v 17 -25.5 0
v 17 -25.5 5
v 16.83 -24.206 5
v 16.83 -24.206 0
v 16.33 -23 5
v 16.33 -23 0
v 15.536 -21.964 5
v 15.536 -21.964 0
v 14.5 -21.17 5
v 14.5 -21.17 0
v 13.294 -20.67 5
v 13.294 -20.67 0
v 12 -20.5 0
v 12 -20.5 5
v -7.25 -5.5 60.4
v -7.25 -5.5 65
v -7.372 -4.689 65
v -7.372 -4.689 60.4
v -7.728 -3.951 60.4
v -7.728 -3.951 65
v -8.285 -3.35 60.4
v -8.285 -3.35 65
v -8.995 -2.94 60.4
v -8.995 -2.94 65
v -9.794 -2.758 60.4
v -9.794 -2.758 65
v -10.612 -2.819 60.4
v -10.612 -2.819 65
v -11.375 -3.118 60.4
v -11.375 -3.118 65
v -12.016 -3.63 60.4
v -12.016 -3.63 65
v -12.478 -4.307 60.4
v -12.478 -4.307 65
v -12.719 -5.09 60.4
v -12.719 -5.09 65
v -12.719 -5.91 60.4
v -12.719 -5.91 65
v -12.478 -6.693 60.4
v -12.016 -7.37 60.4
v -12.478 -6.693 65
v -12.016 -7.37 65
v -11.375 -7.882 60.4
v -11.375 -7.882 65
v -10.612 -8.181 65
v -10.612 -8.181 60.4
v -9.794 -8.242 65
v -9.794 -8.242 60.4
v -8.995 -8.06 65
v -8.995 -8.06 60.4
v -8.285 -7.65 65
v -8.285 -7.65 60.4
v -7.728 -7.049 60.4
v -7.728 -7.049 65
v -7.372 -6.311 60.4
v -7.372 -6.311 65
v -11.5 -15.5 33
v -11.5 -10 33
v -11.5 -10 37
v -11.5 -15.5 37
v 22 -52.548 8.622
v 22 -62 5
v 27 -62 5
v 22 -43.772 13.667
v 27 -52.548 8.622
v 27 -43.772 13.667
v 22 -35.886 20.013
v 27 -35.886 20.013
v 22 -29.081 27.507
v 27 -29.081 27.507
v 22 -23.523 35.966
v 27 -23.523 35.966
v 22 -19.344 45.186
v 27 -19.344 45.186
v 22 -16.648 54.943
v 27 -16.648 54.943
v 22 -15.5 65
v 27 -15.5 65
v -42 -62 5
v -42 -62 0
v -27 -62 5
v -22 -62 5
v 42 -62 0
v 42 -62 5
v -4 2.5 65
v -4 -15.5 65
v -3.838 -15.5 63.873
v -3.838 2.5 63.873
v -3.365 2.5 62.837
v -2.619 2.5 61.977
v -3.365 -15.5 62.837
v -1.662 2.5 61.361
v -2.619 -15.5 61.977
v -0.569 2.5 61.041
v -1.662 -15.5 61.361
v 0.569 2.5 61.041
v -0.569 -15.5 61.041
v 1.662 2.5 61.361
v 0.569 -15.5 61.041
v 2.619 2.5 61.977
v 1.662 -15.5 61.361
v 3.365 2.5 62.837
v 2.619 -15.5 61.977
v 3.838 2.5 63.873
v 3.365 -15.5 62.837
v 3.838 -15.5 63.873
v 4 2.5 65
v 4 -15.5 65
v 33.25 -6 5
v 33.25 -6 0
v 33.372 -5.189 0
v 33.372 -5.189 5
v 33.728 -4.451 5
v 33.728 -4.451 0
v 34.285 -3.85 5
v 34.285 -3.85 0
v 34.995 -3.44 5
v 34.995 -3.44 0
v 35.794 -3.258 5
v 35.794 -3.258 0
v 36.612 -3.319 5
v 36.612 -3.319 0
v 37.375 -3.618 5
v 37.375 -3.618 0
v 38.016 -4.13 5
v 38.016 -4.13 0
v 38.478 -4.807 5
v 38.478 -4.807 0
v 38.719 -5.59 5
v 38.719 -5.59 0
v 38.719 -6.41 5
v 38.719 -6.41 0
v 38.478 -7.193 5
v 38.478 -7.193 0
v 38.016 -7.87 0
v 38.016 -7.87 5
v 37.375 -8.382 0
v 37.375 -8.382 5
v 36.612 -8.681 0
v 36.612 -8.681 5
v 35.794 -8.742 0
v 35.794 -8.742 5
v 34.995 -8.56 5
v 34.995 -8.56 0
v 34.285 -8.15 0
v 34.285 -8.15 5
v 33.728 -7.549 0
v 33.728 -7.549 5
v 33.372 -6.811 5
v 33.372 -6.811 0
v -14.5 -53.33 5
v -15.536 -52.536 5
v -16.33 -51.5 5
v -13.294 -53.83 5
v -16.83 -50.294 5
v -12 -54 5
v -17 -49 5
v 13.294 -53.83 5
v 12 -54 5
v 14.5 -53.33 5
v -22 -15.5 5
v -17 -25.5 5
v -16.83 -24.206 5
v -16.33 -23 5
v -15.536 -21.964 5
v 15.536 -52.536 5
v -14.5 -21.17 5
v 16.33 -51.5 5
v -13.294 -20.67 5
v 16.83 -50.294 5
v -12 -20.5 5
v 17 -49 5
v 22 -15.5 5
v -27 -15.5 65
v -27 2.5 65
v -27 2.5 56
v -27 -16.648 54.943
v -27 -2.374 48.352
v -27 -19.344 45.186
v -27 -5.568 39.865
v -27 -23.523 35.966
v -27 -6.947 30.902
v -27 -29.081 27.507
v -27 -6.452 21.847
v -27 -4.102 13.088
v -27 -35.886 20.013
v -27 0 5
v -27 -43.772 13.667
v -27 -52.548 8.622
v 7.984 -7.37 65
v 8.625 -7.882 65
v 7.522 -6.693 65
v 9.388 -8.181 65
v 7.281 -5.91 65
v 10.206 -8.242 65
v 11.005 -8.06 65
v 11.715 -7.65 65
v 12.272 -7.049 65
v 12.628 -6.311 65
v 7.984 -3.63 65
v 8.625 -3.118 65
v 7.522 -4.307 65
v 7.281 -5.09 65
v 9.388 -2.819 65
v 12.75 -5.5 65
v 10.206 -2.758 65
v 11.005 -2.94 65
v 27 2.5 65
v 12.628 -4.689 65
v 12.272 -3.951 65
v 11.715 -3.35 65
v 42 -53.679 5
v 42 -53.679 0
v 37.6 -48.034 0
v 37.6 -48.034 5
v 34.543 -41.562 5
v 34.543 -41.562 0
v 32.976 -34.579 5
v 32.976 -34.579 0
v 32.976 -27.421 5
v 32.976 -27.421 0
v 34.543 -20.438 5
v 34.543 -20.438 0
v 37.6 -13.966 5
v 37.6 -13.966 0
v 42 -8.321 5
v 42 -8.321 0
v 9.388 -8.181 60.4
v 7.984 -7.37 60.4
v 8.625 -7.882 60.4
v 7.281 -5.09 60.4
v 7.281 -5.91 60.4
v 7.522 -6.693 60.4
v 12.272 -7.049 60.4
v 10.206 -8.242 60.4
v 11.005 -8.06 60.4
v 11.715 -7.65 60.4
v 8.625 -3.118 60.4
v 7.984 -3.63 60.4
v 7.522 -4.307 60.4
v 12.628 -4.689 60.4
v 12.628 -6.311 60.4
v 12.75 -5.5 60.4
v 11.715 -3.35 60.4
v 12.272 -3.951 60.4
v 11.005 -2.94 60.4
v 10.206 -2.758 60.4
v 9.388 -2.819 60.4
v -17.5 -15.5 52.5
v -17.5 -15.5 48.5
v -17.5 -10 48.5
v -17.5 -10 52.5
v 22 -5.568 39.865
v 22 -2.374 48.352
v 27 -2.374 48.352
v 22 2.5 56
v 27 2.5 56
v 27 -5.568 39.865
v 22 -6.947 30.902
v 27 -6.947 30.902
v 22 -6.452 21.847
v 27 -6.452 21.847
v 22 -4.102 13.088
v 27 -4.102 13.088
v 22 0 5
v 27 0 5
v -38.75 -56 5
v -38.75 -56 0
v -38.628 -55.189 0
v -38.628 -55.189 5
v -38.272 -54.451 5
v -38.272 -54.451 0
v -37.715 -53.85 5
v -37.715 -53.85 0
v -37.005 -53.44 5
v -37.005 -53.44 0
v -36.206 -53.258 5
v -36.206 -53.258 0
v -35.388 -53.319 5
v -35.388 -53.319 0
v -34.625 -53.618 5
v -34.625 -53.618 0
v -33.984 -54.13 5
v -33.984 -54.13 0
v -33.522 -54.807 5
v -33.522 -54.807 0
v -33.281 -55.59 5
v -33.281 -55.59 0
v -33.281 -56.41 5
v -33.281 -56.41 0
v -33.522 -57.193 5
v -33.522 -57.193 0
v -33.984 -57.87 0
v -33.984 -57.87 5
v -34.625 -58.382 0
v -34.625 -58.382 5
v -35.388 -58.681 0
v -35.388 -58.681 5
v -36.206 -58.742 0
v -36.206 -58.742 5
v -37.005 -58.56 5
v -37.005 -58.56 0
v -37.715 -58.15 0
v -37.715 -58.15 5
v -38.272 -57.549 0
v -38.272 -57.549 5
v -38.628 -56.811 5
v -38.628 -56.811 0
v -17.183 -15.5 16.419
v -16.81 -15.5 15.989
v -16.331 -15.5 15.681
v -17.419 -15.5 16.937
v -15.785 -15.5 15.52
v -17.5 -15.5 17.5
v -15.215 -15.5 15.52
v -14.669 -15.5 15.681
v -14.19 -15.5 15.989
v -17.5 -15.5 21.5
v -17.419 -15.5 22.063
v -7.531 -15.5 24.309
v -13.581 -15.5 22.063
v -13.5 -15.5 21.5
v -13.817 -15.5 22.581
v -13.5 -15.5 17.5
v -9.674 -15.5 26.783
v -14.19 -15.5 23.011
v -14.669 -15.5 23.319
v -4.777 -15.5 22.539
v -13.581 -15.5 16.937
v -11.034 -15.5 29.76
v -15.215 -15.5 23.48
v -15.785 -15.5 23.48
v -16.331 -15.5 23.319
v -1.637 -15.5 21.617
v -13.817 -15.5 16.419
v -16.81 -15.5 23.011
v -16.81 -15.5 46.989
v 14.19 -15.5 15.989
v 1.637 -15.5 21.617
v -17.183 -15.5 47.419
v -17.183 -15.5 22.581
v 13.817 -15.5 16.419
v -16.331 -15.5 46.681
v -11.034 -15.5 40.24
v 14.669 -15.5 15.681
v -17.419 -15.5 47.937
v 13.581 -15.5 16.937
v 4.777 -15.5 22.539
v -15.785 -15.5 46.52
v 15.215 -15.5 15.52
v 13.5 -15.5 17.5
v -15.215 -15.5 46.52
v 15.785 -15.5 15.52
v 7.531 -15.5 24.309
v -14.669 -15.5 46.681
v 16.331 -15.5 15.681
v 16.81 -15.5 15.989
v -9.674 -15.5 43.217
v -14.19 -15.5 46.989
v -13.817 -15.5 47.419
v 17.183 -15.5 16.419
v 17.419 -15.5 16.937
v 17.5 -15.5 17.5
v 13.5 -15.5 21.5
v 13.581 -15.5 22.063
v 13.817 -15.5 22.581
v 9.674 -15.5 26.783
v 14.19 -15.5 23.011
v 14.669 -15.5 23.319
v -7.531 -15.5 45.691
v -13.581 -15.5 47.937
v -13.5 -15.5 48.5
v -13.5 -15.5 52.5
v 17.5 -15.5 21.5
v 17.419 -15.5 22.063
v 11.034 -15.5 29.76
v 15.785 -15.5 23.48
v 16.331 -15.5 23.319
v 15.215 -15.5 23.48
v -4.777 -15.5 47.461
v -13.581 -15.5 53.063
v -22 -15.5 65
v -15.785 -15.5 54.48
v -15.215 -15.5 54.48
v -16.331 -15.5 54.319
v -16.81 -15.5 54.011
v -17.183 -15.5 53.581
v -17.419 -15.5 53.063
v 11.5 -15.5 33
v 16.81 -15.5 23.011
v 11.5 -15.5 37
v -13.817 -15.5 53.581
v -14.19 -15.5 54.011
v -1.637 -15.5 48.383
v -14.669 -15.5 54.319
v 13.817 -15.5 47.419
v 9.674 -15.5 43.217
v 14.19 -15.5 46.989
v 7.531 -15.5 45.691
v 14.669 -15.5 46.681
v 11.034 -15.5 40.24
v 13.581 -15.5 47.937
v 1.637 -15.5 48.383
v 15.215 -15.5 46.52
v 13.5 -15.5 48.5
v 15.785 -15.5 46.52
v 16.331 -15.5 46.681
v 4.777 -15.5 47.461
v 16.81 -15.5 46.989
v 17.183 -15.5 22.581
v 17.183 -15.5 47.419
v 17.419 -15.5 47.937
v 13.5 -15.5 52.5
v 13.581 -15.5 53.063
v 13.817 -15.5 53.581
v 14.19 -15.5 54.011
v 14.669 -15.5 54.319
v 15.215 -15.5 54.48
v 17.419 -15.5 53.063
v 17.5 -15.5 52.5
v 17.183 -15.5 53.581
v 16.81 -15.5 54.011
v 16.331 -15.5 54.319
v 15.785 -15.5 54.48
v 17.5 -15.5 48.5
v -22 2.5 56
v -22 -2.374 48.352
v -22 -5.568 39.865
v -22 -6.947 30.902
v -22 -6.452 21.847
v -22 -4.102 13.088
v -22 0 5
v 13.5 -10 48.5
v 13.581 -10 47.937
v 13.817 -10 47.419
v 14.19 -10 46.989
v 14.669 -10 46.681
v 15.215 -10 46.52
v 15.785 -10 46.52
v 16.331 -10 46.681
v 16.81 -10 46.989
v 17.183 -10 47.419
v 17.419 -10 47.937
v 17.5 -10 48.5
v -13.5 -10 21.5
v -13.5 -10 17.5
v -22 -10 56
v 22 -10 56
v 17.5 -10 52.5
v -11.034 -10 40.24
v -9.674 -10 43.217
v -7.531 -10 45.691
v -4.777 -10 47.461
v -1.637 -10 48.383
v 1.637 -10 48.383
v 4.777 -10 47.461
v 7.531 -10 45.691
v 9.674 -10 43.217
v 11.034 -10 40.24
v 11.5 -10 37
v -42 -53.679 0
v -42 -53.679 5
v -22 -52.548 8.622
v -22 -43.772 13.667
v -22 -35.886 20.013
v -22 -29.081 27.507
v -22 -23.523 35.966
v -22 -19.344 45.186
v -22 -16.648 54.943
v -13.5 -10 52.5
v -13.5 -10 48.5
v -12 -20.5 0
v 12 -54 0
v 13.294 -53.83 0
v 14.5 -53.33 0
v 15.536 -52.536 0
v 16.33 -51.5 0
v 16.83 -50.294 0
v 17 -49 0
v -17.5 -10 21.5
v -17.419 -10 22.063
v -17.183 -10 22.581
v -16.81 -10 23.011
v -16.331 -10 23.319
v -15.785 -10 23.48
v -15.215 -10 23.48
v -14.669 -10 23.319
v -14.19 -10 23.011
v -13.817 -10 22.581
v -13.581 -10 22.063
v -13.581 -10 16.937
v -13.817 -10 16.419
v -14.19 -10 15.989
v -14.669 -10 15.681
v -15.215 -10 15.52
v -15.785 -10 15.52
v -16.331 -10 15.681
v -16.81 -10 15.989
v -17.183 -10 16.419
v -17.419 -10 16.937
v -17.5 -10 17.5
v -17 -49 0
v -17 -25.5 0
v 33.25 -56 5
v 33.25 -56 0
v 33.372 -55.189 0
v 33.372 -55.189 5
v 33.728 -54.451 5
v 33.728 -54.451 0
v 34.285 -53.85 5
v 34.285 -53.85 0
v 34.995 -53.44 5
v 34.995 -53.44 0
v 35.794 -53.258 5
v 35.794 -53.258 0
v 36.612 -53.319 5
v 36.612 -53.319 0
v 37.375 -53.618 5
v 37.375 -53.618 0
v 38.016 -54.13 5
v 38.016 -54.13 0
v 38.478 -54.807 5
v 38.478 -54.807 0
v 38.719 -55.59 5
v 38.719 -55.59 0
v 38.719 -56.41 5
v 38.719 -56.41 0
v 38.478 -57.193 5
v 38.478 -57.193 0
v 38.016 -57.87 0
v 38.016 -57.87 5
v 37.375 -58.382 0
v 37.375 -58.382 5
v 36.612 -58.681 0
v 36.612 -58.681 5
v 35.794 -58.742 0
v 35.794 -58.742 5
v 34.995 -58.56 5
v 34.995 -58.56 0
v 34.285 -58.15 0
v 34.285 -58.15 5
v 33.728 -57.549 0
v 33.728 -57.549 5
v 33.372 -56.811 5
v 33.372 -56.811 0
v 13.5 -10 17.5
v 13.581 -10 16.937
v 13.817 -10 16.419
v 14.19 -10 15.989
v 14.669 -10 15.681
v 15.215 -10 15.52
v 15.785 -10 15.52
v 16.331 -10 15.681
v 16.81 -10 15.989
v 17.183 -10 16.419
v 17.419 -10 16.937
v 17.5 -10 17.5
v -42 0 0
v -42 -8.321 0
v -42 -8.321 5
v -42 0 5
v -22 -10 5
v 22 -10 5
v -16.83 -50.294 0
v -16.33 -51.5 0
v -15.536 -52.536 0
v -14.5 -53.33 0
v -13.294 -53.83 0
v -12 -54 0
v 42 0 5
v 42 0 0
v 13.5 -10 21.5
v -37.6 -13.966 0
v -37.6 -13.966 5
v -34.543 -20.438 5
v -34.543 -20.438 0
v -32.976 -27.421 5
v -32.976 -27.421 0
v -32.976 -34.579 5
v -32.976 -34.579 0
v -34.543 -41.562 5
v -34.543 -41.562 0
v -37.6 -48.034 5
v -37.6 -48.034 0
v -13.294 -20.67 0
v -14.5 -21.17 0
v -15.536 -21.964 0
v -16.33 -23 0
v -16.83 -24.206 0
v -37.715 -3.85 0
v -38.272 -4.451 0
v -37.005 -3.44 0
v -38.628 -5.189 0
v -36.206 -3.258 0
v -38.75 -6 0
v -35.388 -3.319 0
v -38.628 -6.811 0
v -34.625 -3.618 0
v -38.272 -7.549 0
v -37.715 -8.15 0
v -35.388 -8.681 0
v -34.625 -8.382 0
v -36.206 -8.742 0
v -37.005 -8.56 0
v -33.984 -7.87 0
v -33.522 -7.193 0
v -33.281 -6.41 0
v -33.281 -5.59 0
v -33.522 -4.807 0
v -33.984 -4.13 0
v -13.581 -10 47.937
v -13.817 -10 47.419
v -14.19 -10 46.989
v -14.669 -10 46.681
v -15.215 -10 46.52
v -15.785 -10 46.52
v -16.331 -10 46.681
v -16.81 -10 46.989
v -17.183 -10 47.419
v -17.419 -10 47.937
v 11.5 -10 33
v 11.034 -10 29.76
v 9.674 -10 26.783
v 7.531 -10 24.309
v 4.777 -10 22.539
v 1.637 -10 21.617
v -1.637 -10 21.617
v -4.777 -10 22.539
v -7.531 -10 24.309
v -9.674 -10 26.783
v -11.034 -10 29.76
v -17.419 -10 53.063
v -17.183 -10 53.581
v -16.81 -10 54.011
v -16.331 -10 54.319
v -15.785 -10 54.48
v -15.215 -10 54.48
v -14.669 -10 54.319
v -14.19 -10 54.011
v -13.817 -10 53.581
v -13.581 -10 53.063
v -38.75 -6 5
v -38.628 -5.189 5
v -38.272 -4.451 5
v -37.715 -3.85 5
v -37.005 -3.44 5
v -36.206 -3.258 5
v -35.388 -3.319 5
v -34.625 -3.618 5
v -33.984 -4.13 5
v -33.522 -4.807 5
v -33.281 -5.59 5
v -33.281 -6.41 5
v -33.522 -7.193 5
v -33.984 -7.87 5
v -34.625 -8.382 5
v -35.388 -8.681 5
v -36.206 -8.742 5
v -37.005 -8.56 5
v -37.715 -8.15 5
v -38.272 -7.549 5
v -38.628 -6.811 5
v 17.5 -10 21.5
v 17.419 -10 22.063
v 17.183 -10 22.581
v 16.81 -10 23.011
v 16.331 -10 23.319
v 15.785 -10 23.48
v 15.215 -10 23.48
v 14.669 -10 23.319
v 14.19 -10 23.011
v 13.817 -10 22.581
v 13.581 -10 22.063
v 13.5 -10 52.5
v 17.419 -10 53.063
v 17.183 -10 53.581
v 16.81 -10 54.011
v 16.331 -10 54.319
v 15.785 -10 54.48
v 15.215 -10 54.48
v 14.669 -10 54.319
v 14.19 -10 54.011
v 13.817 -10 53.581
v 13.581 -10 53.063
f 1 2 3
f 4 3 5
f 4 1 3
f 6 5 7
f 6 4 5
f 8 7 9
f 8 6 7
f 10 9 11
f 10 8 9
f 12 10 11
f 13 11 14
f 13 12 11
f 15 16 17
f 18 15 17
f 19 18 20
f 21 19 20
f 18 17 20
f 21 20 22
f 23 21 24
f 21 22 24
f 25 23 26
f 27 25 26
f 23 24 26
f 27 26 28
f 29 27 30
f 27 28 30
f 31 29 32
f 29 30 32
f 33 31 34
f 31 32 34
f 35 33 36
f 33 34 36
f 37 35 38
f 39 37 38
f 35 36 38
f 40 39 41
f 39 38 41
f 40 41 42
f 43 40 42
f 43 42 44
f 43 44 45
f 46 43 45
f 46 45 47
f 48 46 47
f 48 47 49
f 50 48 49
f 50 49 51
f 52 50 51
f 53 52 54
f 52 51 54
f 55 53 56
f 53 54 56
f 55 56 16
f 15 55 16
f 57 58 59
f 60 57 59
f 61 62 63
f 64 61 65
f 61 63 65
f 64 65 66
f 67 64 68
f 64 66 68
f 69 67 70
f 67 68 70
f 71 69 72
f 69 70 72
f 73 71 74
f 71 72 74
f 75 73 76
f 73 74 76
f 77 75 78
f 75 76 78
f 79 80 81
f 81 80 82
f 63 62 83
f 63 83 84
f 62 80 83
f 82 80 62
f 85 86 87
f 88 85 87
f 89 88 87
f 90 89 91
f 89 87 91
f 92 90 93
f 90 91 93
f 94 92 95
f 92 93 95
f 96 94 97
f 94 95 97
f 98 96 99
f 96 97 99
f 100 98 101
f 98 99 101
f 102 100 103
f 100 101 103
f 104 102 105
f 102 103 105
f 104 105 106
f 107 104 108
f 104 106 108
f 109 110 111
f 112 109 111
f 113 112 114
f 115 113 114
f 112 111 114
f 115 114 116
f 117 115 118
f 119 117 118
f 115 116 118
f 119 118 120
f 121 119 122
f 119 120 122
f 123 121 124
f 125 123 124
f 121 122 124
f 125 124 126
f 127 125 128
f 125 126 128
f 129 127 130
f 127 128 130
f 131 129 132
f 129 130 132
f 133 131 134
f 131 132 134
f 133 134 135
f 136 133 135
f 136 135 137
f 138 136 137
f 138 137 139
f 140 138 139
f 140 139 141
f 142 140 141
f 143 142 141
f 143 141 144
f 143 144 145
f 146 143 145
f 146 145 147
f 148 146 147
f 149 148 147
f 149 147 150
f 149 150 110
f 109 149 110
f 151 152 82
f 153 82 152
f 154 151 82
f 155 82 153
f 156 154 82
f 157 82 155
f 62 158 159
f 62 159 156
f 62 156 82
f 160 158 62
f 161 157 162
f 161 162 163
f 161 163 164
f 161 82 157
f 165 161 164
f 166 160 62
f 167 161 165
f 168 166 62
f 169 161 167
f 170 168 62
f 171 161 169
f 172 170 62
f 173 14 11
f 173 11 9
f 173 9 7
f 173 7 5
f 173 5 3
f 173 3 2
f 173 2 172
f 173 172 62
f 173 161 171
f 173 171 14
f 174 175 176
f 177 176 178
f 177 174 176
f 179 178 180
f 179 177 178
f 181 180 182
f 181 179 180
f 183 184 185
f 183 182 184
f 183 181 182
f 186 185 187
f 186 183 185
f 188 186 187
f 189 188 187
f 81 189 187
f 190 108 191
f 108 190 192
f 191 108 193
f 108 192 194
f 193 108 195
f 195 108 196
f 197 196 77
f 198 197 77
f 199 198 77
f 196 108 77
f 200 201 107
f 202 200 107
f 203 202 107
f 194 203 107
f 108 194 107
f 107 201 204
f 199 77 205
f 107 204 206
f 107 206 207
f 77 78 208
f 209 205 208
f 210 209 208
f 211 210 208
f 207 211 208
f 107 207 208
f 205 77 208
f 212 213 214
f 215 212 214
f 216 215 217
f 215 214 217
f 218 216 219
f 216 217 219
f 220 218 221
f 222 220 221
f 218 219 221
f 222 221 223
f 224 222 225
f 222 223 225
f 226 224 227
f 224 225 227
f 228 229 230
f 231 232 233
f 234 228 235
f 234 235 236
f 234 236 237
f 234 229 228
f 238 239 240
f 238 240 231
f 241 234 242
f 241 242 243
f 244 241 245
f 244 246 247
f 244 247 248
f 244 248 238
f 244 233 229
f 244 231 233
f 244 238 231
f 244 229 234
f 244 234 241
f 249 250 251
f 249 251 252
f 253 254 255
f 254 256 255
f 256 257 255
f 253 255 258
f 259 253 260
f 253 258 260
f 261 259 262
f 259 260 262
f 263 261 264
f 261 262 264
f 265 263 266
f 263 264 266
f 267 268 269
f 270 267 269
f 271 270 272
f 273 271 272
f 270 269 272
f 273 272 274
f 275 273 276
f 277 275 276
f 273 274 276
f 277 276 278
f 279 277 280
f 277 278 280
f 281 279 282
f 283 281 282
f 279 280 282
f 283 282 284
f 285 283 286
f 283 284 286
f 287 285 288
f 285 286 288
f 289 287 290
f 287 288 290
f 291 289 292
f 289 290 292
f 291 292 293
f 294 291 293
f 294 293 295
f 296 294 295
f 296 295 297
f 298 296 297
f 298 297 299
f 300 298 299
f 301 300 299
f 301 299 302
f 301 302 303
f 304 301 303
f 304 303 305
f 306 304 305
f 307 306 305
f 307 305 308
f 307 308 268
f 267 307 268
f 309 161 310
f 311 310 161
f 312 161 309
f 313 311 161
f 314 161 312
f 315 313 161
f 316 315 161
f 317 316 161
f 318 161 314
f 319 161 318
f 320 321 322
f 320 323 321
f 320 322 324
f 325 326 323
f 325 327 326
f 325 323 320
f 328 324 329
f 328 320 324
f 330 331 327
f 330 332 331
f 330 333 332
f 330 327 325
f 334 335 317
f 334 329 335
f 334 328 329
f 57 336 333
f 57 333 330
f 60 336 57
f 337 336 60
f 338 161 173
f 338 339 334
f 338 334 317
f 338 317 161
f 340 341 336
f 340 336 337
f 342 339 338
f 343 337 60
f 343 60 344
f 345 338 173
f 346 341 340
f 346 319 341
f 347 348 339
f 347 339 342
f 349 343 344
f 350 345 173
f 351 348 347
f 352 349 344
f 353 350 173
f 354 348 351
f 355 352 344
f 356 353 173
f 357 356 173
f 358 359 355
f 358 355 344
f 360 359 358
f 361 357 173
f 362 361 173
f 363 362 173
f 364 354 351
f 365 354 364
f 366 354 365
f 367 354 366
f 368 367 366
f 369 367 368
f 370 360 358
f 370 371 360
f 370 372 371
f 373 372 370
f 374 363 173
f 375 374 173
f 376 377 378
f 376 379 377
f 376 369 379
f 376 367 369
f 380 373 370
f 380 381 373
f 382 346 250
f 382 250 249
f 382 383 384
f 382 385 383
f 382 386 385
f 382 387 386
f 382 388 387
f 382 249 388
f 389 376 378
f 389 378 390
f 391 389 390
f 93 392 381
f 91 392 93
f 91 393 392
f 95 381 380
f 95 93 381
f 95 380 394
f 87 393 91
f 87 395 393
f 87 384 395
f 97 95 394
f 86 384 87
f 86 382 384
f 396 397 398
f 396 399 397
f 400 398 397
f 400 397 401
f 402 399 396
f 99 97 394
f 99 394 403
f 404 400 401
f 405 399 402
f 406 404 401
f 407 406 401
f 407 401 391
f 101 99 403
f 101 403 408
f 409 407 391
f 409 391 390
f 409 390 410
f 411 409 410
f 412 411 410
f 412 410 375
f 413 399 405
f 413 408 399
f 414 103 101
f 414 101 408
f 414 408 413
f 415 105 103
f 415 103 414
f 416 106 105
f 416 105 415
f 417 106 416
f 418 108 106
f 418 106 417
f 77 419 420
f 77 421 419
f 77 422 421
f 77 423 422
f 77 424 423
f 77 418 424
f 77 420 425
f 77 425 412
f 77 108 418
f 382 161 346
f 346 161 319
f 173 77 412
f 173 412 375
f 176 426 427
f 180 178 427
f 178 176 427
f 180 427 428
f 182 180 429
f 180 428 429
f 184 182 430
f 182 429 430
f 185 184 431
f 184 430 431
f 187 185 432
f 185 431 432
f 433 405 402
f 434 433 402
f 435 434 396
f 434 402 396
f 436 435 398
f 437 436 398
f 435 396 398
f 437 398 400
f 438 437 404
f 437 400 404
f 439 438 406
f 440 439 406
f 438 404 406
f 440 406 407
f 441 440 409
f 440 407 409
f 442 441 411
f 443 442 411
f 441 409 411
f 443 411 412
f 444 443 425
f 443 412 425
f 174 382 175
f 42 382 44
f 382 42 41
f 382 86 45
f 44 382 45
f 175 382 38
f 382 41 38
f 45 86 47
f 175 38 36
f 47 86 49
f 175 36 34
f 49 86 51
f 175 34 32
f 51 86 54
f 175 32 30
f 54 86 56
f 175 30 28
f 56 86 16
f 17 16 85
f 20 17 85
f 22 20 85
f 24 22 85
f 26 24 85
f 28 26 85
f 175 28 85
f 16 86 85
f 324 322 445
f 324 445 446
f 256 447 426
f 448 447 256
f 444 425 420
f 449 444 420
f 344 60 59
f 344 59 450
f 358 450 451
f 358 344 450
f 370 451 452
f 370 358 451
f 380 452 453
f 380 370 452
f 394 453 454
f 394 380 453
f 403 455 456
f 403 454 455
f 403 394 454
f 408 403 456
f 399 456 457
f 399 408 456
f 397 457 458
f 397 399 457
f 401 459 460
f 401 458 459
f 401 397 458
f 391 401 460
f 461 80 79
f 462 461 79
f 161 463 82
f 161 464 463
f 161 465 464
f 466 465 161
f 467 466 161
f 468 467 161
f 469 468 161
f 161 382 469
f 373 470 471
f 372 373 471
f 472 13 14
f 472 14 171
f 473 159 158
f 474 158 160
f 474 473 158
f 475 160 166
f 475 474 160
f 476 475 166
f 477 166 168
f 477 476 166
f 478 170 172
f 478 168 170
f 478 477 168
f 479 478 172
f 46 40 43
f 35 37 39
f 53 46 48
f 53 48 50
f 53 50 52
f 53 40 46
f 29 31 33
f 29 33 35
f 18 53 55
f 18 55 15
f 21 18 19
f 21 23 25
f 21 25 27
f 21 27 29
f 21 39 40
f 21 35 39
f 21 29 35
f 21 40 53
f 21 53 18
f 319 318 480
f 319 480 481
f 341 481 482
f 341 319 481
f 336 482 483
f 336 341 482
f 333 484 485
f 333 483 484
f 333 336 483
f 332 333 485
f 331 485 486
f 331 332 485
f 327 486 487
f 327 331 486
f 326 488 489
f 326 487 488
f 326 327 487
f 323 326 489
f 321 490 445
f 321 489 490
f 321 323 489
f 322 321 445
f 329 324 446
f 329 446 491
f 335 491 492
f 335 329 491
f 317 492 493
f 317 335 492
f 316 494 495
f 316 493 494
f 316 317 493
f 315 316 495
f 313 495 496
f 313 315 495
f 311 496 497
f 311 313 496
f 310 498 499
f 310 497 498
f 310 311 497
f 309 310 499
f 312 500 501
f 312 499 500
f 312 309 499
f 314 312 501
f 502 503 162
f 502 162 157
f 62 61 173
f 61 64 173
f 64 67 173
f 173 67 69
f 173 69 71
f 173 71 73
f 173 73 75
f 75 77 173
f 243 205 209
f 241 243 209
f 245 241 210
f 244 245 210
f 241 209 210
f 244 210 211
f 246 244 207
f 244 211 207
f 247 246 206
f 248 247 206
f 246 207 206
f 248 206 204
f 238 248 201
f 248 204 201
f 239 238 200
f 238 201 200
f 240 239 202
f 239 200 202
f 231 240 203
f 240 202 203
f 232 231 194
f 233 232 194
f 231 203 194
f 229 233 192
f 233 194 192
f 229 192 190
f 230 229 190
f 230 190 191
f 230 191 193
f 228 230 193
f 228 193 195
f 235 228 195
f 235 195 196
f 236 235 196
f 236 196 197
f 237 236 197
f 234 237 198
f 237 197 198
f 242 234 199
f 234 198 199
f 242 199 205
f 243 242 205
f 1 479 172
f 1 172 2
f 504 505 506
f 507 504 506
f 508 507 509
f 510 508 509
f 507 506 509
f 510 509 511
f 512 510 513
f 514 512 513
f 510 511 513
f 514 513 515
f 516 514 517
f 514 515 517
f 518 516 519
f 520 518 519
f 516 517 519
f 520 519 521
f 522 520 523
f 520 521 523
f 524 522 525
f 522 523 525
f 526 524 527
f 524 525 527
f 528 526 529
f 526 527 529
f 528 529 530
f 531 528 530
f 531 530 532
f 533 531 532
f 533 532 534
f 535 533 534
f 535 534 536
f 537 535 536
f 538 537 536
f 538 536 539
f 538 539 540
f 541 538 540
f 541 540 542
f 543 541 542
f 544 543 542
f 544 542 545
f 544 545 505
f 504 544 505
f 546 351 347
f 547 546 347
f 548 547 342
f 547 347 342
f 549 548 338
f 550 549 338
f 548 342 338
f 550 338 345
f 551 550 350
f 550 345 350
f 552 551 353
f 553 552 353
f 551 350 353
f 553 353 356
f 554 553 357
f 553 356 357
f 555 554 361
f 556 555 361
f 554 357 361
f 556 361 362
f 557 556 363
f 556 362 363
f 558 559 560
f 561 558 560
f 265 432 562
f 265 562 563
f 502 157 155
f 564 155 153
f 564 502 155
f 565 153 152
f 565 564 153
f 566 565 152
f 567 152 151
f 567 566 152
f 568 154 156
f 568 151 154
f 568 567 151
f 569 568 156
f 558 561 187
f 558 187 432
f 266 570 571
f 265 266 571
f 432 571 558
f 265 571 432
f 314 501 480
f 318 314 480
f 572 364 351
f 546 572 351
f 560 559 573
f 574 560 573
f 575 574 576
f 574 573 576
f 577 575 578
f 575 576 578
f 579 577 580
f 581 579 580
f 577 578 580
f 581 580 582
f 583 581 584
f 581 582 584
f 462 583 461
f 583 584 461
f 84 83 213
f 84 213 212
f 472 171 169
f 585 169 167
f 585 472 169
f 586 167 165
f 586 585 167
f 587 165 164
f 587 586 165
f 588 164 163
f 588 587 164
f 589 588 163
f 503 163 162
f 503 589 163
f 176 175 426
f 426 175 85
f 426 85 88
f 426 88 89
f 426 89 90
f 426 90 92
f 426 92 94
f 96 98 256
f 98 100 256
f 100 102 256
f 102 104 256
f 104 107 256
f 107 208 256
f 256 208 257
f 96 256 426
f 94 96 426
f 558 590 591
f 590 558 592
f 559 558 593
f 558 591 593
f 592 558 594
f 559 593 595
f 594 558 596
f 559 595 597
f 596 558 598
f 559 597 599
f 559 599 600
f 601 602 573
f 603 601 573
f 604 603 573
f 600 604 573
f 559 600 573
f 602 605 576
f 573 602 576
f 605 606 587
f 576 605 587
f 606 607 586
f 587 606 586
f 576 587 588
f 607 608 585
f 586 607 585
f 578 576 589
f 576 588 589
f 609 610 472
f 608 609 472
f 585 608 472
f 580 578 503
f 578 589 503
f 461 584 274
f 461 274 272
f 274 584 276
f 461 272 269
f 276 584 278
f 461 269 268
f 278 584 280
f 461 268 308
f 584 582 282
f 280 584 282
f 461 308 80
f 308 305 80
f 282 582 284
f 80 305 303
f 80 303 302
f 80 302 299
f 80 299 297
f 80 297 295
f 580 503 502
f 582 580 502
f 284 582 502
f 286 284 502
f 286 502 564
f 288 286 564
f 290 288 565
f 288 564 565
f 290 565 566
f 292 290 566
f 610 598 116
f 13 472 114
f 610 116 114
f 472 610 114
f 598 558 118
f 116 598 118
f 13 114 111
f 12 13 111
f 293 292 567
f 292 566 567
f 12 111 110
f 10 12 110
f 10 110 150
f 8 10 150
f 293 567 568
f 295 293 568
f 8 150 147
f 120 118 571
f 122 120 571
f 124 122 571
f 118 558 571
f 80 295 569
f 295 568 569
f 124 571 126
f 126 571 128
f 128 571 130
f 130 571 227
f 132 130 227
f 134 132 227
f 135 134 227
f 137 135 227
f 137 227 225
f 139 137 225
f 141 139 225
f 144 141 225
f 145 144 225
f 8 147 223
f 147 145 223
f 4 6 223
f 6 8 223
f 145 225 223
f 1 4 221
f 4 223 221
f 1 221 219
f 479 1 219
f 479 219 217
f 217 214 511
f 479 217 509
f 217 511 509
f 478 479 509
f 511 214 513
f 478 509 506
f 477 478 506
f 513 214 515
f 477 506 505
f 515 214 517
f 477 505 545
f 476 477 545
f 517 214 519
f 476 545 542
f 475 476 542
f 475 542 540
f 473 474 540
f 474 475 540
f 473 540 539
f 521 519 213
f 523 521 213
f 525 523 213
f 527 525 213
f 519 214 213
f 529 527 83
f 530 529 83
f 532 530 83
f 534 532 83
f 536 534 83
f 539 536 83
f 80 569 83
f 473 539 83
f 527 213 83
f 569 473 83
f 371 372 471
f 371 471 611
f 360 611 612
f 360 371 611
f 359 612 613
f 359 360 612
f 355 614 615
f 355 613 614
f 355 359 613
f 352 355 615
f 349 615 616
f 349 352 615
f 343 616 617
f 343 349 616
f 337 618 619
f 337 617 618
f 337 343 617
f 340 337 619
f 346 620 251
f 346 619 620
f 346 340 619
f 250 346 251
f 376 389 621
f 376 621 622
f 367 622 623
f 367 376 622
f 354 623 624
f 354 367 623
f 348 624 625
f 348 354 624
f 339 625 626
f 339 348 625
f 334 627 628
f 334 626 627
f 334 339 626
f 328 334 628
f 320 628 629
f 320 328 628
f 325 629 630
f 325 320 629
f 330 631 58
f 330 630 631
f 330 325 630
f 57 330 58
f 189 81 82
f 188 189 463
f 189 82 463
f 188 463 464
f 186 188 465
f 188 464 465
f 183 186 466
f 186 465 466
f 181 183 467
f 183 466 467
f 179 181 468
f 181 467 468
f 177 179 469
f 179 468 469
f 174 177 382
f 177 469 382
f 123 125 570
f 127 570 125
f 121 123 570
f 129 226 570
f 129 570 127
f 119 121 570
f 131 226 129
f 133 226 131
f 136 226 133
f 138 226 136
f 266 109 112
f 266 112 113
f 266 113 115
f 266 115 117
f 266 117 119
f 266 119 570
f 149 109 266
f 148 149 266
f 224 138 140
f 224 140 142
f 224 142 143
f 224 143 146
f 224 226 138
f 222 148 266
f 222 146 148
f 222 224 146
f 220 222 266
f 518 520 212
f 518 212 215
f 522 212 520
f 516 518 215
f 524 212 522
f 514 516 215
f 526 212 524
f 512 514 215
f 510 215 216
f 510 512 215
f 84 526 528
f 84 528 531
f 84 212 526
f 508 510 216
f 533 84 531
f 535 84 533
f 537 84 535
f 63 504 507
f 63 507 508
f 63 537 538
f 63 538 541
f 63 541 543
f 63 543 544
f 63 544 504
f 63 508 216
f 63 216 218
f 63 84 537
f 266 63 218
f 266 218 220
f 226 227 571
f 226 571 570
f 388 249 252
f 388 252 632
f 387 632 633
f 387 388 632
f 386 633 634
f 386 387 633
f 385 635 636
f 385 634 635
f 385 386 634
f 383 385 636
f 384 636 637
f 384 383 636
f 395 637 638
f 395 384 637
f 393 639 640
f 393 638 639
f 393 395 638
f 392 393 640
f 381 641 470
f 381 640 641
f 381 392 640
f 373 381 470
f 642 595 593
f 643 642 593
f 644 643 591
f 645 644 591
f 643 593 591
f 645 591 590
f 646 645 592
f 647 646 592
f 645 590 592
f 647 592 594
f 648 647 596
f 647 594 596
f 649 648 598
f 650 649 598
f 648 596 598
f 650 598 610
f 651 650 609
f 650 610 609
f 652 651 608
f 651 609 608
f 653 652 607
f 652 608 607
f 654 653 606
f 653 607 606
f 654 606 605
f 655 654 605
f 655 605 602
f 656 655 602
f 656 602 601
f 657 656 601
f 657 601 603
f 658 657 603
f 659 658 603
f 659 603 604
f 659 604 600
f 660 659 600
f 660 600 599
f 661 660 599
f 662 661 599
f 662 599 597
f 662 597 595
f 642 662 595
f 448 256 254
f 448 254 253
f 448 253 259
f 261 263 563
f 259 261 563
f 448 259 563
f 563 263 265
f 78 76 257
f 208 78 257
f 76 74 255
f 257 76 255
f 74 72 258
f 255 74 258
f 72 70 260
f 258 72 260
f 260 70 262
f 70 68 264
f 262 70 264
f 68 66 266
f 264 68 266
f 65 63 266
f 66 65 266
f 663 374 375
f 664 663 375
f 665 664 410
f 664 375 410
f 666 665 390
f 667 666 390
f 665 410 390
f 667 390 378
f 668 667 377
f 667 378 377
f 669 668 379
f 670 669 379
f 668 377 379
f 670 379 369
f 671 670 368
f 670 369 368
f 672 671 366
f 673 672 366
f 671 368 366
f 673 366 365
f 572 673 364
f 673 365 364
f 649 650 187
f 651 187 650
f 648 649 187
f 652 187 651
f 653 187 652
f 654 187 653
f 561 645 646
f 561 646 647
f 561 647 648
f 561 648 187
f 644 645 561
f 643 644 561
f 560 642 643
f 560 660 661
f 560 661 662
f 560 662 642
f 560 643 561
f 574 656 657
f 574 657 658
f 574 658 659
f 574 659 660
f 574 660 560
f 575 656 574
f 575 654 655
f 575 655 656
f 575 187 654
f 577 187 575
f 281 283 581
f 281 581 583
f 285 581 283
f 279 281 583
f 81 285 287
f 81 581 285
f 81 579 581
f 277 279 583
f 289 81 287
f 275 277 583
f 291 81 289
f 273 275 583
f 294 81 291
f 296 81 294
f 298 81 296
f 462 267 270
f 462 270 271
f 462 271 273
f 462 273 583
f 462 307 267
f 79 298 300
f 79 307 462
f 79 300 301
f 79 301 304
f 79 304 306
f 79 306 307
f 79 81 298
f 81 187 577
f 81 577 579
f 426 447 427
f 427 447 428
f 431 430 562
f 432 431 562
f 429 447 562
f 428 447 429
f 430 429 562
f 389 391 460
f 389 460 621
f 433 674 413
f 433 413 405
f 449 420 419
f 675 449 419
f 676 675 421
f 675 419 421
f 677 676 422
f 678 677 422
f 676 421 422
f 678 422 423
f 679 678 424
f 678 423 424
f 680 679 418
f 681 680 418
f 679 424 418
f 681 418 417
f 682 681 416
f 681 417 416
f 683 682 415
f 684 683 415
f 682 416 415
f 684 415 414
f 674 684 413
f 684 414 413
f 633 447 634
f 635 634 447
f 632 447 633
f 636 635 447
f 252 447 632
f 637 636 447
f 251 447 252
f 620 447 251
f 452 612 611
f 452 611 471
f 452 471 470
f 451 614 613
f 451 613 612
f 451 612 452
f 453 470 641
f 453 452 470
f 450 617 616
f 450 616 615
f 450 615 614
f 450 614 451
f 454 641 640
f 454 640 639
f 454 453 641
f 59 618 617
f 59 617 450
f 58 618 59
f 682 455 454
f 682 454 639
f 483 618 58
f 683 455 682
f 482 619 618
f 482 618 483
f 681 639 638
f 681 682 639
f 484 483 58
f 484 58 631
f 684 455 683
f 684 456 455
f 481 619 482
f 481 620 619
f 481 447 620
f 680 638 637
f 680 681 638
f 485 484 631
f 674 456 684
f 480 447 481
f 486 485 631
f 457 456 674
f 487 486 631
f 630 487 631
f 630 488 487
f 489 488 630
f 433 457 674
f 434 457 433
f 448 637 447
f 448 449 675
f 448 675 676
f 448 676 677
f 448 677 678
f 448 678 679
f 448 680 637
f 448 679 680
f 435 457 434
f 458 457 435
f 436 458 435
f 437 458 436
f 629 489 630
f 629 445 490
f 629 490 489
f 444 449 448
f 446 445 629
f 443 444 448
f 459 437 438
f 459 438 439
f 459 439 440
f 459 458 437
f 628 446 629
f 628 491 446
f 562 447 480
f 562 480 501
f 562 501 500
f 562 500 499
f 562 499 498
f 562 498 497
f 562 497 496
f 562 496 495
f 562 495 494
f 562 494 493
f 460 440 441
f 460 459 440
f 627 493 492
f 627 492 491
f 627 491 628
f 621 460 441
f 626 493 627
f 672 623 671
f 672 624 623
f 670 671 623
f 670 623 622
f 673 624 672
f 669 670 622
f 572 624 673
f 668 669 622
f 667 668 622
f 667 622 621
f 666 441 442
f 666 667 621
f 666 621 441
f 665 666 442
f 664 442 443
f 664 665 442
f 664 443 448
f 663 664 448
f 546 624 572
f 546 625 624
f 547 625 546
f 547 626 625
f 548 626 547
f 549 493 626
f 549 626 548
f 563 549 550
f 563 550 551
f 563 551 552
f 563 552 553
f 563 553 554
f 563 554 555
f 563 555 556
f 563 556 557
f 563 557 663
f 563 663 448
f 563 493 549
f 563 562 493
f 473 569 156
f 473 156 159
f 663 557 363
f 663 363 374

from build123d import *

# Parameters (mm, degrees)
BOSS_EXTRUDE1_DEPTH      = 42
BOSS_EXTRUDE1_DEPTH_BACK = 42
SKETCH2_W                = 15
SKETCH2_H                = 2.5
SKETCH2_R                = 2.75
CUT_EXTRUDE1_DEPTH       = 100.161484458
SKETCH3_R                = 4
SKETCH3_W                = 15
SKETCH3_H                = 60
CUT_EXTRUDE2_DEPTH       = 101.743486312
SKETCH4_W                = 44
SKETCH4_H                = 46.5
CUT_EXTRUDE3_DEPTH       = 60
CUT_EXTRUDE4_DEPTH       = 10
CUT_EXTRUDE4_DEPTH_BACK  = 10
SKETCH5_W                = 44
SKETCH5_H                = 51
SKETCH6_R                = 2.75
CUT_EXTRUDE5_DEPTH       = 4.6


with BuildPart() as part:
    # Sketch1 → Boss-Extrude1 (new, two sides: drawn at the far end of the back side and taken through both)
    with BuildSketch(Plane(origin=(0, 0, 0), x_dir=(0, 0, -1), z_dir=(1, 0, 0)).offset(-BOSS_EXTRUDE1_DEPTH_BACK)):
        with BuildLine():
            Line((0, 0), (0, -62))
            Line((0, -62), (-5, -62))
            ThreePointArc((-5, -62), (-27.506882202, -29.081460906), (-65, -15.5))
            Line((-65, -15.5), (-65, 2.5))
            Line((-65, 2.5), (-56, 2.5))
            ThreePointArc((-56, 2.5), (-30.901836055, -6.947455525), (-5, 0))
            Line((-5, 0), (0, 0))
        make_face()
    extrude(amount=BOSS_EXTRUDE1_DEPTH + BOSS_EXTRUDE1_DEPTH_BACK)

    # Sketch2 → Cut-Extrude1 (cut, through all)
    with BuildSketch(Plane(origin=(0, 0, 0), x_dir=(-1, 0, 0), z_dir=(0, 0, -1))):
        with BuildLine():
            ThreePointArc((-17, -49), (-15.535533906, -52.535533906), (-12, -54))
            Line((-12, -54), (12, -54))
            ThreePointArc((12, -54), (15.535533906, -52.535533906), (17, -49))
            Line((17, -49), (17, -25.5))
            ThreePointArc((17, -25.5), (15.535533906, -21.964466094), (12, -20.5))
            Line((12, -20.5), (-12, -20.5))
            ThreePointArc((-12, -20.5), (-15.535533906, -21.964466094), (-17, -25.5))
            Line((-17, -25.5), (-17, -49))
        make_face()
        with Locations((-34.5, 1.25)):
            Rectangle(SKETCH2_W, SKETCH2_H)
        with BuildLine():
            Line((42, -53.6792), (42, -8.3208))
            ThreePointArc((42, -8.3208), (32.778829166, -31), (42, -53.6792))
        make_face()
        with Locations((34.5, 1.25)):
            Rectangle(SKETCH2_W, SKETCH2_H)
        with BuildLine():
            ThreePointArc((-42, -53.6792), (-32.778829166, -31), (-42, -8.3208))
            Line((-42, -8.3208), (-42, -53.6792))
        make_face()
        with Locations((-36, -6)):
            Circle(SKETCH2_R)
        with Locations((36, -6)):
            Circle(SKETCH2_R)
        with Locations((36, -56)):
            Circle(SKETCH2_R)
        with Locations((-36, -56)):
            Circle(SKETCH2_R)
    extrude(amount=-CUT_EXTRUDE1_DEPTH, mode=Mode.SUBTRACT)

    # Sketch3 → Cut-Extrude2 (cut, through all)
    with BuildSketch(Plane(origin=(0, -62, 0), x_dir=(-1, 0, 0), z_dir=(0, -1, 0))):
        with Locations((0, -65)):
            Circle(SKETCH3_R)
        with Locations((34.5, -35)):
            Rectangle(SKETCH3_W, SKETCH3_H)
        with Locations((-34.5, -35)):
            Rectangle(SKETCH3_W, SKETCH3_H)
        with BuildLine():
            Line((11.5, -33), (11.5, -37))
            ThreePointArc((11.5, -37), (0, -48.5), (-11.5, -37))
            Line((-11.5, -37), (-11.5, -33))
            ThreePointArc((-11.5, -33), (0, -21.5), (11.5, -33))
        make_face()
        with BuildLine():
            Line((17.5, -48.5), (17.5, -52.5))
            ThreePointArc((17.5, -52.5), (15.5, -54.5), (13.5, -52.5))
            Line((13.5, -52.5), (13.5, -48.5))
            ThreePointArc((13.5, -48.5), (15.5, -46.5), (17.5, -48.5))
        make_face()
        with BuildLine():
            Line((17.5, -17.5), (17.5, -21.5))
            ThreePointArc((17.5, -21.5), (15.5, -23.5), (13.5, -21.5))
            Line((13.5, -21.5), (13.5, -17.5))
            ThreePointArc((13.5, -17.5), (15.5, -15.5), (17.5, -17.5))
        make_face()
        with BuildLine():
            Line((-17.5, -17.5), (-17.5, -21.5))
            ThreePointArc((-17.5, -21.5), (-15.5, -23.5), (-13.5, -21.5))
            Line((-13.5, -21.5), (-13.5, -17.5))
            ThreePointArc((-13.5, -17.5), (-15.5, -15.5), (-17.5, -17.5))
        make_face()
        with BuildLine():
            Line((-17.5, -48.5), (-17.5, -52.5))
            ThreePointArc((-17.5, -52.5), (-15.5, -54.5), (-13.5, -52.5))
            Line((-13.5, -52.5), (-13.5, -48.5))
            ThreePointArc((-13.5, -48.5), (-15.5, -46.5), (-17.5, -48.5))
        make_face()
    extrude(amount=-CUT_EXTRUDE2_DEPTH, mode=Mode.SUBTRACT)

    # Sketch4 → Cut-Extrude3 (cut)
    with BuildSketch(Plane.XY.offset(65)):
        with Locations((0, -38.75)):
            Rectangle(SKETCH4_W, SKETCH4_H)
    extrude(amount=-CUT_EXTRUDE3_DEPTH, mode=Mode.SUBTRACT)

    # Sketch5 → Cut-Extrude4 (cut, two sides: drawn at the far end of the back side and taken through both)
    with BuildSketch(Plane(origin=(0, 0, 0), x_dir=(1, 0, 0), z_dir=(0, 1, 0)).offset(-CUT_EXTRUDE4_DEPTH_BACK)):
        with Locations((0, -30.5)):
            Rectangle(SKETCH5_W, SKETCH5_H)
    extrude(amount=CUT_EXTRUDE4_DEPTH + CUT_EXTRUDE4_DEPTH_BACK, mode=Mode.SUBTRACT)

    # Sketch6 → Cut-Extrude5 (cut)
    with BuildSketch(Plane.XY.offset(65)):
        with Locations((-10, -5.5)):
            Circle(SKETCH6_R)
        with Locations((10, -5.5)):
            Circle(SKETCH6_R)
    extrude(amount=-CUT_EXTRUDE5_DEPTH, mode=Mode.SUBTRACT)


solid = part.part
